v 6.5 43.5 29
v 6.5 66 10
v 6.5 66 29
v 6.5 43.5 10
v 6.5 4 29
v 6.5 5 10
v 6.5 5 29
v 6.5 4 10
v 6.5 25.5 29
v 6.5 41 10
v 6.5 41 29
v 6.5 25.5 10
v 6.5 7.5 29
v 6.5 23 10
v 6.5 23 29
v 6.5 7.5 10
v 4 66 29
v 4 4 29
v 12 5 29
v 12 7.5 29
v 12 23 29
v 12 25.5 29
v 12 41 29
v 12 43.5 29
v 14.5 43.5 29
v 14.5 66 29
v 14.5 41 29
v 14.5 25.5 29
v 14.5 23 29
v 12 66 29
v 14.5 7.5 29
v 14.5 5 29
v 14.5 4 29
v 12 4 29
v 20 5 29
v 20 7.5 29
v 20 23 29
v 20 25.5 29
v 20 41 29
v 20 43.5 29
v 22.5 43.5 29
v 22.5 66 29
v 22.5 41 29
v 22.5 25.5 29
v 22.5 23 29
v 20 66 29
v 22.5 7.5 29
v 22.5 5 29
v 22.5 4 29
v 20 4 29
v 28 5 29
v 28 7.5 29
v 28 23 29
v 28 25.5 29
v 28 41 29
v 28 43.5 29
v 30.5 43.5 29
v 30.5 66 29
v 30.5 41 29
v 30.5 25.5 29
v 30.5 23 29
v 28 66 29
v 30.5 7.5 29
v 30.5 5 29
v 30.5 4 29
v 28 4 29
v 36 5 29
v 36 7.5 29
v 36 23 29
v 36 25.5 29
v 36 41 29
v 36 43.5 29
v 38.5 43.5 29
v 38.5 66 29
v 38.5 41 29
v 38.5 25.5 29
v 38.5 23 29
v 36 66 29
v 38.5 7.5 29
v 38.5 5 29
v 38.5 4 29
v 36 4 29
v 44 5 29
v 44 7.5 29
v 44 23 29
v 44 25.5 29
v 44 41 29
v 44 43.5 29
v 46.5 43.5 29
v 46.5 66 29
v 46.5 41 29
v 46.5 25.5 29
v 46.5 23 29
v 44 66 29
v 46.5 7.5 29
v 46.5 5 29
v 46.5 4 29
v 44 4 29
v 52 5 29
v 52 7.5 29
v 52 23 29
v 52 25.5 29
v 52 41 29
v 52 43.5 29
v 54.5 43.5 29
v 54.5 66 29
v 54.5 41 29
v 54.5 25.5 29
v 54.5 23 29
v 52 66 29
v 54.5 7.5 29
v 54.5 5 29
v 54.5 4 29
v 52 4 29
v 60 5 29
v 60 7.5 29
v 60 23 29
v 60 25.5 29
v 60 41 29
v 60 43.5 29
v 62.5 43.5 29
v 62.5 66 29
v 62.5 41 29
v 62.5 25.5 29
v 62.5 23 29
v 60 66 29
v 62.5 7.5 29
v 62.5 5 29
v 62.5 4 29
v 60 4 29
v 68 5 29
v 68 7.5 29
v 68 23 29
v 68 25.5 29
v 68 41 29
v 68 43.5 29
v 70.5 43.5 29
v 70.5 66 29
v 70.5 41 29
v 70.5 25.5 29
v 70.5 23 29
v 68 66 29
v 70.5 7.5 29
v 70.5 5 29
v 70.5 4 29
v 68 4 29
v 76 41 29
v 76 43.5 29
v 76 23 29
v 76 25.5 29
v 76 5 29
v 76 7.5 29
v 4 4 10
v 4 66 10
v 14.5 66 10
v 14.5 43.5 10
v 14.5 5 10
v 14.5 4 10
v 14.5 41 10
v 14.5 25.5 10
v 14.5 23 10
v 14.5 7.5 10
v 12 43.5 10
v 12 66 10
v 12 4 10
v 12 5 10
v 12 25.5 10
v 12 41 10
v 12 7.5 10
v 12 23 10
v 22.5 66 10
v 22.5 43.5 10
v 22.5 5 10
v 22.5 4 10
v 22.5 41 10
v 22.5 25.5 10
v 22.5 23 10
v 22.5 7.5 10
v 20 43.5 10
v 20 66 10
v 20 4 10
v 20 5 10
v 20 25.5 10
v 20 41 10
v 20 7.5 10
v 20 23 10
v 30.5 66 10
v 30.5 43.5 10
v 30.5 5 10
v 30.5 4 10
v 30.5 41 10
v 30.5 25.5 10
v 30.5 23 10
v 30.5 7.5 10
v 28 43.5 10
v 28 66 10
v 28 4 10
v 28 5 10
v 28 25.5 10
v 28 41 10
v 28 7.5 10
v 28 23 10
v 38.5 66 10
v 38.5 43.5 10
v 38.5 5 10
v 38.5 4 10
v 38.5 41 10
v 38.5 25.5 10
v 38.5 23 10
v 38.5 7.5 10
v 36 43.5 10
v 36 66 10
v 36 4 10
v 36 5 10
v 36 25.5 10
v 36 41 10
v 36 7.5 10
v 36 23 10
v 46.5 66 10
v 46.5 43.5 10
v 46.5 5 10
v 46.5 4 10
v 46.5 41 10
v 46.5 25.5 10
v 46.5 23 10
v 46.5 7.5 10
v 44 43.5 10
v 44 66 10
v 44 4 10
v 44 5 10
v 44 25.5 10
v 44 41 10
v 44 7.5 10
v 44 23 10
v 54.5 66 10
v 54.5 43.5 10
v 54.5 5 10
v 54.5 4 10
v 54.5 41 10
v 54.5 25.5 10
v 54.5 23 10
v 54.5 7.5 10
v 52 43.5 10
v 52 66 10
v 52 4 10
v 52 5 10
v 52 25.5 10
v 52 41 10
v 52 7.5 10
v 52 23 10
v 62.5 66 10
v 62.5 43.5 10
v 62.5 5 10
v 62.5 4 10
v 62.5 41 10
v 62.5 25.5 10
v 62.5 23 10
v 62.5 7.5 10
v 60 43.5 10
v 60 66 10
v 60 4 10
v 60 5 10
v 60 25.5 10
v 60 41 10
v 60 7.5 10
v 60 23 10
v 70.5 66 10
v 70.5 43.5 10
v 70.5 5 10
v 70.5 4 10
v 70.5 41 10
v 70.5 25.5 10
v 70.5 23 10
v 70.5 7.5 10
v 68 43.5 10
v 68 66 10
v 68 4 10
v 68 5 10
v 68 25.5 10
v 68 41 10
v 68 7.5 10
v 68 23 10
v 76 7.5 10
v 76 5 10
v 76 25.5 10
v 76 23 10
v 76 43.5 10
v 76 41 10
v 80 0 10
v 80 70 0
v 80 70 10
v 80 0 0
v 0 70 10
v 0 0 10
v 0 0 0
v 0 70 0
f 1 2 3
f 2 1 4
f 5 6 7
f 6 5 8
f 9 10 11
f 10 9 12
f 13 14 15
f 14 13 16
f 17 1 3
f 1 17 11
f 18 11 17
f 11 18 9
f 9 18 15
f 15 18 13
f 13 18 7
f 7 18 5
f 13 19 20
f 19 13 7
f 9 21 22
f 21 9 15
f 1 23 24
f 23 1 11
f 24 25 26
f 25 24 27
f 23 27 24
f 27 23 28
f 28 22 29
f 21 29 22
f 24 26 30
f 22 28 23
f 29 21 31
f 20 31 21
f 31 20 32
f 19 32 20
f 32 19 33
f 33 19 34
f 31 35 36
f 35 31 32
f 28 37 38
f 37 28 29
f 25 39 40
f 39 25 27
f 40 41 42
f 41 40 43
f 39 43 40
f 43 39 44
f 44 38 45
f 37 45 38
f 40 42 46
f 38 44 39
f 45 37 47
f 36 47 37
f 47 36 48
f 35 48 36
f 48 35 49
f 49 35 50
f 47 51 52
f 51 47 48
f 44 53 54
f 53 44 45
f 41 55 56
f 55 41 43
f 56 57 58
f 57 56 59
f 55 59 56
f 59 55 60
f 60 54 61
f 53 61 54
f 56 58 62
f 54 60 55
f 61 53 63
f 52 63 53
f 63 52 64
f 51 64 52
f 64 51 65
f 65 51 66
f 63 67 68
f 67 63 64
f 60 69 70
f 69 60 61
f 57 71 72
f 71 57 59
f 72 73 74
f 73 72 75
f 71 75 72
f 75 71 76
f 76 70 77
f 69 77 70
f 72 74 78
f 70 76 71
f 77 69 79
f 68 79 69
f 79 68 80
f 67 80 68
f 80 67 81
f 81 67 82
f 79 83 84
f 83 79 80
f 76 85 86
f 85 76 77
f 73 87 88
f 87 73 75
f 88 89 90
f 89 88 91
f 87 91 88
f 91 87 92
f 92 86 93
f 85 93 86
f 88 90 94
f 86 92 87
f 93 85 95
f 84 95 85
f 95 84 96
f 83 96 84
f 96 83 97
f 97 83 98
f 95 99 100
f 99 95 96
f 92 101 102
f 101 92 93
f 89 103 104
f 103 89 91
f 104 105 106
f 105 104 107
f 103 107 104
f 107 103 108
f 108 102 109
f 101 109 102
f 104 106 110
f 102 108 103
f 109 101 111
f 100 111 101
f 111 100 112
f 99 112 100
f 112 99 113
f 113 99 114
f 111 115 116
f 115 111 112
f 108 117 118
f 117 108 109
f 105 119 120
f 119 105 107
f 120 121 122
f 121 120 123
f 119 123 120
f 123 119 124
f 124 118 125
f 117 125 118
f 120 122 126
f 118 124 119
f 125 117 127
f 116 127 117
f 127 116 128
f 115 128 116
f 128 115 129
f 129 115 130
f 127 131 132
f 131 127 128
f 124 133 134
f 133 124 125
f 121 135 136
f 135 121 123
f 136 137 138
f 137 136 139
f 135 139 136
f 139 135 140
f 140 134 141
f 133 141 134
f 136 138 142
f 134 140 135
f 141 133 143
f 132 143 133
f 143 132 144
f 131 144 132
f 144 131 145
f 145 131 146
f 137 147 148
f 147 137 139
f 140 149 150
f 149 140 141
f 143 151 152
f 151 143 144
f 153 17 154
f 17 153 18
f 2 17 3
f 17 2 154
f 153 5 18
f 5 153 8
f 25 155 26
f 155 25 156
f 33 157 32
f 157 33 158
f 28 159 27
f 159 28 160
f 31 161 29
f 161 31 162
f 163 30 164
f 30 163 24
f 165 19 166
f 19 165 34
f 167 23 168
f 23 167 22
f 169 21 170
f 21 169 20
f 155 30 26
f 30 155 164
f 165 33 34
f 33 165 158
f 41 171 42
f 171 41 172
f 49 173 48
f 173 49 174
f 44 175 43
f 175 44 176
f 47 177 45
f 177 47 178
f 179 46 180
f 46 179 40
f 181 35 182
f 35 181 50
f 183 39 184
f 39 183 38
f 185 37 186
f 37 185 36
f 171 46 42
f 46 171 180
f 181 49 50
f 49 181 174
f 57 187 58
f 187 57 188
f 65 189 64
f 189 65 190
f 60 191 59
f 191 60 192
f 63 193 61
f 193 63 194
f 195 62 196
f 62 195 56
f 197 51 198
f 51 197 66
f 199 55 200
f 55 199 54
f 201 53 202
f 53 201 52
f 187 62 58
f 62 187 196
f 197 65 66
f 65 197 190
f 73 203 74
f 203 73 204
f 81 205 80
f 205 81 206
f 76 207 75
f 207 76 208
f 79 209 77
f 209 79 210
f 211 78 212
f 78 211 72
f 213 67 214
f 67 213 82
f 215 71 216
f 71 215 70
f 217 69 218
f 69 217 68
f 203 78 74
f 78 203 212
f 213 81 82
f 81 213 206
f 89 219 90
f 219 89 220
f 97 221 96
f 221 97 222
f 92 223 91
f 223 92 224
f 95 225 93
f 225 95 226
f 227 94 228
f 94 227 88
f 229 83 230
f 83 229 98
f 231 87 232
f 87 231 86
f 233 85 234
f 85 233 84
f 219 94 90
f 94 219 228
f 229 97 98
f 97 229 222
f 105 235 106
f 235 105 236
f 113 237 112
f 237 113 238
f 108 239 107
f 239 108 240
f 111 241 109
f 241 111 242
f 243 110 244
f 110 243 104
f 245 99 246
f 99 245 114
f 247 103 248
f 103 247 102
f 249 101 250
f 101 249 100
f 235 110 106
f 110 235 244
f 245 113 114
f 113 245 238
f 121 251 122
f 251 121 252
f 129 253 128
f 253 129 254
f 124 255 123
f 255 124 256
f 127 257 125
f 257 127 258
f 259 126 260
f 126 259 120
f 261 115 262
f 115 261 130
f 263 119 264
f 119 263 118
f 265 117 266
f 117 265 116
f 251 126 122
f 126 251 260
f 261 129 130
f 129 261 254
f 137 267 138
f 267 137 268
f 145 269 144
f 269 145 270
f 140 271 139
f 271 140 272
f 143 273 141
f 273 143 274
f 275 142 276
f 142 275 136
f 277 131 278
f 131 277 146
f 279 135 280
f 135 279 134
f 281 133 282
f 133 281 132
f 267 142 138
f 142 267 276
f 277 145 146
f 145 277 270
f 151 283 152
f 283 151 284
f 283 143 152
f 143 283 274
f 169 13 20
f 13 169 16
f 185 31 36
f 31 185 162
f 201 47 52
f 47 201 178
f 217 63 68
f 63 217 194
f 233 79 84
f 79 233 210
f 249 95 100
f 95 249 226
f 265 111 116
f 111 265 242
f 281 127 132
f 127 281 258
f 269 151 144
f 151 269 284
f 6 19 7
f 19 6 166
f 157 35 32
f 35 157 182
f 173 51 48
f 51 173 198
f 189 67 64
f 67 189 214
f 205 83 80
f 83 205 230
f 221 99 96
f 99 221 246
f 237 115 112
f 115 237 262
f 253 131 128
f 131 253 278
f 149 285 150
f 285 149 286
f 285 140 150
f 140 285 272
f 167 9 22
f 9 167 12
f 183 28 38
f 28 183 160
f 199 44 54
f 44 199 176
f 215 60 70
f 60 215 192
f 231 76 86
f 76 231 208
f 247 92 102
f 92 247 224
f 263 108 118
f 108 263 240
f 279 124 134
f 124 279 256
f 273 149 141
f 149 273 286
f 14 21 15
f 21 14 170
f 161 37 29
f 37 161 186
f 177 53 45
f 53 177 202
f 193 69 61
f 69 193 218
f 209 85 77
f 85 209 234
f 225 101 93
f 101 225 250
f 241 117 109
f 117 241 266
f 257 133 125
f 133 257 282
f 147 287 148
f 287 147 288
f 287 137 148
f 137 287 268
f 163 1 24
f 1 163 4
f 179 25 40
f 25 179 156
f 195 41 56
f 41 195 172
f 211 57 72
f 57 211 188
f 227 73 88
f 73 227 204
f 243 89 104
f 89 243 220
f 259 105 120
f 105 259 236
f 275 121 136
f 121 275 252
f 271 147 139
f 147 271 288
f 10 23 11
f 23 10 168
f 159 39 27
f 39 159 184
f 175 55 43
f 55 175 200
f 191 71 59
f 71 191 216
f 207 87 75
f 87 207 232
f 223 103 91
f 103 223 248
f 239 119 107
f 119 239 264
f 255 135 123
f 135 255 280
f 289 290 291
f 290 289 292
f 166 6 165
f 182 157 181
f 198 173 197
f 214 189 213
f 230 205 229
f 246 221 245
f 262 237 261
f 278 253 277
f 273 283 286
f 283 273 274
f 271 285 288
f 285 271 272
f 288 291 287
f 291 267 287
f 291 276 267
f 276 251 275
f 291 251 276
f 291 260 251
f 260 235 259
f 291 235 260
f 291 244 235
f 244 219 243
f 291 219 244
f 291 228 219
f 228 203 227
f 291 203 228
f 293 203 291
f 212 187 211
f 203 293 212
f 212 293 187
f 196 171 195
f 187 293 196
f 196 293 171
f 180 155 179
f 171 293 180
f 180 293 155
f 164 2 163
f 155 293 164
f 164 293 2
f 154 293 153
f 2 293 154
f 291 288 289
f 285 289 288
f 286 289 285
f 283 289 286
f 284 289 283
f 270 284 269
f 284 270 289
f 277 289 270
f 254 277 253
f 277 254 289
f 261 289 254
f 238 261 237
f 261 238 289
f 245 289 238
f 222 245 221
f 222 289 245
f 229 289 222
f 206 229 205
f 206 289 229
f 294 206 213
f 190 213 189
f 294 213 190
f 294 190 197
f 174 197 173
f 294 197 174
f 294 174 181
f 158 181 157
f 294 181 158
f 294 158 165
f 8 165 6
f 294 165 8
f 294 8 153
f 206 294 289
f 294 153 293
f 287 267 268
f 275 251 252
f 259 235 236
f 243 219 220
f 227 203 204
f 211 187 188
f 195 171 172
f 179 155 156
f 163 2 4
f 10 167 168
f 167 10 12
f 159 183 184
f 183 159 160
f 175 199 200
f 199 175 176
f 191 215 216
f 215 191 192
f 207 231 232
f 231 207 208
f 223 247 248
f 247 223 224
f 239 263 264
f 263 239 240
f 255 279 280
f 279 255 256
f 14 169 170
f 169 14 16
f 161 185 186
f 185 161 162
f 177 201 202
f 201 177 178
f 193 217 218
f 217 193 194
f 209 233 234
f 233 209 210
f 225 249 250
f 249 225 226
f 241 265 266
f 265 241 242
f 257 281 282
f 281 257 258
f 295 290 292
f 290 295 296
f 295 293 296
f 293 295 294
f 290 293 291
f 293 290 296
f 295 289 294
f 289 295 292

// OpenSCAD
$fn = 32;

// ----------------------------------------------------------------------
// Heatsink: cross fin block
// ----------------------------------------------------------------------

// --- parameters (mm) ---
base_l = 80;              // base length, X
base_w = 70;              // base width, Y
base_t = 10;              // base plate thickness
fin_h = 20;               // fin height above the base
fin_t = 2.5;              // fin thickness
edge = 4;                 // margin from the base ends
pitch = 8;                // fin pitch
rib_pitch = 18;           // cross rib pitch

n_fins = floor((base_l - 2 * edge - fin_t) / pitch) + 1;  // fin count
total_h = base_t + fin_h - 1;  // overall height
n_ribs = floor((base_w - 2 * edge) / rib_pitch);  // rib count

union() {
  cube([base_l, base_w, base_t]);
  for (i = [0 : n_fins - 1])
    translate([edge + i * pitch, edge, base_t - 1])
      cube([fin_t, base_w - 2 * edge, fin_h]);
  for (i = [0 : n_ribs - 1])
    translate([edge, edge + 1 + i * rib_pitch, base_t - 1])
      cube([base_l - 2 * edge, fin_t, fin_h]);
}
